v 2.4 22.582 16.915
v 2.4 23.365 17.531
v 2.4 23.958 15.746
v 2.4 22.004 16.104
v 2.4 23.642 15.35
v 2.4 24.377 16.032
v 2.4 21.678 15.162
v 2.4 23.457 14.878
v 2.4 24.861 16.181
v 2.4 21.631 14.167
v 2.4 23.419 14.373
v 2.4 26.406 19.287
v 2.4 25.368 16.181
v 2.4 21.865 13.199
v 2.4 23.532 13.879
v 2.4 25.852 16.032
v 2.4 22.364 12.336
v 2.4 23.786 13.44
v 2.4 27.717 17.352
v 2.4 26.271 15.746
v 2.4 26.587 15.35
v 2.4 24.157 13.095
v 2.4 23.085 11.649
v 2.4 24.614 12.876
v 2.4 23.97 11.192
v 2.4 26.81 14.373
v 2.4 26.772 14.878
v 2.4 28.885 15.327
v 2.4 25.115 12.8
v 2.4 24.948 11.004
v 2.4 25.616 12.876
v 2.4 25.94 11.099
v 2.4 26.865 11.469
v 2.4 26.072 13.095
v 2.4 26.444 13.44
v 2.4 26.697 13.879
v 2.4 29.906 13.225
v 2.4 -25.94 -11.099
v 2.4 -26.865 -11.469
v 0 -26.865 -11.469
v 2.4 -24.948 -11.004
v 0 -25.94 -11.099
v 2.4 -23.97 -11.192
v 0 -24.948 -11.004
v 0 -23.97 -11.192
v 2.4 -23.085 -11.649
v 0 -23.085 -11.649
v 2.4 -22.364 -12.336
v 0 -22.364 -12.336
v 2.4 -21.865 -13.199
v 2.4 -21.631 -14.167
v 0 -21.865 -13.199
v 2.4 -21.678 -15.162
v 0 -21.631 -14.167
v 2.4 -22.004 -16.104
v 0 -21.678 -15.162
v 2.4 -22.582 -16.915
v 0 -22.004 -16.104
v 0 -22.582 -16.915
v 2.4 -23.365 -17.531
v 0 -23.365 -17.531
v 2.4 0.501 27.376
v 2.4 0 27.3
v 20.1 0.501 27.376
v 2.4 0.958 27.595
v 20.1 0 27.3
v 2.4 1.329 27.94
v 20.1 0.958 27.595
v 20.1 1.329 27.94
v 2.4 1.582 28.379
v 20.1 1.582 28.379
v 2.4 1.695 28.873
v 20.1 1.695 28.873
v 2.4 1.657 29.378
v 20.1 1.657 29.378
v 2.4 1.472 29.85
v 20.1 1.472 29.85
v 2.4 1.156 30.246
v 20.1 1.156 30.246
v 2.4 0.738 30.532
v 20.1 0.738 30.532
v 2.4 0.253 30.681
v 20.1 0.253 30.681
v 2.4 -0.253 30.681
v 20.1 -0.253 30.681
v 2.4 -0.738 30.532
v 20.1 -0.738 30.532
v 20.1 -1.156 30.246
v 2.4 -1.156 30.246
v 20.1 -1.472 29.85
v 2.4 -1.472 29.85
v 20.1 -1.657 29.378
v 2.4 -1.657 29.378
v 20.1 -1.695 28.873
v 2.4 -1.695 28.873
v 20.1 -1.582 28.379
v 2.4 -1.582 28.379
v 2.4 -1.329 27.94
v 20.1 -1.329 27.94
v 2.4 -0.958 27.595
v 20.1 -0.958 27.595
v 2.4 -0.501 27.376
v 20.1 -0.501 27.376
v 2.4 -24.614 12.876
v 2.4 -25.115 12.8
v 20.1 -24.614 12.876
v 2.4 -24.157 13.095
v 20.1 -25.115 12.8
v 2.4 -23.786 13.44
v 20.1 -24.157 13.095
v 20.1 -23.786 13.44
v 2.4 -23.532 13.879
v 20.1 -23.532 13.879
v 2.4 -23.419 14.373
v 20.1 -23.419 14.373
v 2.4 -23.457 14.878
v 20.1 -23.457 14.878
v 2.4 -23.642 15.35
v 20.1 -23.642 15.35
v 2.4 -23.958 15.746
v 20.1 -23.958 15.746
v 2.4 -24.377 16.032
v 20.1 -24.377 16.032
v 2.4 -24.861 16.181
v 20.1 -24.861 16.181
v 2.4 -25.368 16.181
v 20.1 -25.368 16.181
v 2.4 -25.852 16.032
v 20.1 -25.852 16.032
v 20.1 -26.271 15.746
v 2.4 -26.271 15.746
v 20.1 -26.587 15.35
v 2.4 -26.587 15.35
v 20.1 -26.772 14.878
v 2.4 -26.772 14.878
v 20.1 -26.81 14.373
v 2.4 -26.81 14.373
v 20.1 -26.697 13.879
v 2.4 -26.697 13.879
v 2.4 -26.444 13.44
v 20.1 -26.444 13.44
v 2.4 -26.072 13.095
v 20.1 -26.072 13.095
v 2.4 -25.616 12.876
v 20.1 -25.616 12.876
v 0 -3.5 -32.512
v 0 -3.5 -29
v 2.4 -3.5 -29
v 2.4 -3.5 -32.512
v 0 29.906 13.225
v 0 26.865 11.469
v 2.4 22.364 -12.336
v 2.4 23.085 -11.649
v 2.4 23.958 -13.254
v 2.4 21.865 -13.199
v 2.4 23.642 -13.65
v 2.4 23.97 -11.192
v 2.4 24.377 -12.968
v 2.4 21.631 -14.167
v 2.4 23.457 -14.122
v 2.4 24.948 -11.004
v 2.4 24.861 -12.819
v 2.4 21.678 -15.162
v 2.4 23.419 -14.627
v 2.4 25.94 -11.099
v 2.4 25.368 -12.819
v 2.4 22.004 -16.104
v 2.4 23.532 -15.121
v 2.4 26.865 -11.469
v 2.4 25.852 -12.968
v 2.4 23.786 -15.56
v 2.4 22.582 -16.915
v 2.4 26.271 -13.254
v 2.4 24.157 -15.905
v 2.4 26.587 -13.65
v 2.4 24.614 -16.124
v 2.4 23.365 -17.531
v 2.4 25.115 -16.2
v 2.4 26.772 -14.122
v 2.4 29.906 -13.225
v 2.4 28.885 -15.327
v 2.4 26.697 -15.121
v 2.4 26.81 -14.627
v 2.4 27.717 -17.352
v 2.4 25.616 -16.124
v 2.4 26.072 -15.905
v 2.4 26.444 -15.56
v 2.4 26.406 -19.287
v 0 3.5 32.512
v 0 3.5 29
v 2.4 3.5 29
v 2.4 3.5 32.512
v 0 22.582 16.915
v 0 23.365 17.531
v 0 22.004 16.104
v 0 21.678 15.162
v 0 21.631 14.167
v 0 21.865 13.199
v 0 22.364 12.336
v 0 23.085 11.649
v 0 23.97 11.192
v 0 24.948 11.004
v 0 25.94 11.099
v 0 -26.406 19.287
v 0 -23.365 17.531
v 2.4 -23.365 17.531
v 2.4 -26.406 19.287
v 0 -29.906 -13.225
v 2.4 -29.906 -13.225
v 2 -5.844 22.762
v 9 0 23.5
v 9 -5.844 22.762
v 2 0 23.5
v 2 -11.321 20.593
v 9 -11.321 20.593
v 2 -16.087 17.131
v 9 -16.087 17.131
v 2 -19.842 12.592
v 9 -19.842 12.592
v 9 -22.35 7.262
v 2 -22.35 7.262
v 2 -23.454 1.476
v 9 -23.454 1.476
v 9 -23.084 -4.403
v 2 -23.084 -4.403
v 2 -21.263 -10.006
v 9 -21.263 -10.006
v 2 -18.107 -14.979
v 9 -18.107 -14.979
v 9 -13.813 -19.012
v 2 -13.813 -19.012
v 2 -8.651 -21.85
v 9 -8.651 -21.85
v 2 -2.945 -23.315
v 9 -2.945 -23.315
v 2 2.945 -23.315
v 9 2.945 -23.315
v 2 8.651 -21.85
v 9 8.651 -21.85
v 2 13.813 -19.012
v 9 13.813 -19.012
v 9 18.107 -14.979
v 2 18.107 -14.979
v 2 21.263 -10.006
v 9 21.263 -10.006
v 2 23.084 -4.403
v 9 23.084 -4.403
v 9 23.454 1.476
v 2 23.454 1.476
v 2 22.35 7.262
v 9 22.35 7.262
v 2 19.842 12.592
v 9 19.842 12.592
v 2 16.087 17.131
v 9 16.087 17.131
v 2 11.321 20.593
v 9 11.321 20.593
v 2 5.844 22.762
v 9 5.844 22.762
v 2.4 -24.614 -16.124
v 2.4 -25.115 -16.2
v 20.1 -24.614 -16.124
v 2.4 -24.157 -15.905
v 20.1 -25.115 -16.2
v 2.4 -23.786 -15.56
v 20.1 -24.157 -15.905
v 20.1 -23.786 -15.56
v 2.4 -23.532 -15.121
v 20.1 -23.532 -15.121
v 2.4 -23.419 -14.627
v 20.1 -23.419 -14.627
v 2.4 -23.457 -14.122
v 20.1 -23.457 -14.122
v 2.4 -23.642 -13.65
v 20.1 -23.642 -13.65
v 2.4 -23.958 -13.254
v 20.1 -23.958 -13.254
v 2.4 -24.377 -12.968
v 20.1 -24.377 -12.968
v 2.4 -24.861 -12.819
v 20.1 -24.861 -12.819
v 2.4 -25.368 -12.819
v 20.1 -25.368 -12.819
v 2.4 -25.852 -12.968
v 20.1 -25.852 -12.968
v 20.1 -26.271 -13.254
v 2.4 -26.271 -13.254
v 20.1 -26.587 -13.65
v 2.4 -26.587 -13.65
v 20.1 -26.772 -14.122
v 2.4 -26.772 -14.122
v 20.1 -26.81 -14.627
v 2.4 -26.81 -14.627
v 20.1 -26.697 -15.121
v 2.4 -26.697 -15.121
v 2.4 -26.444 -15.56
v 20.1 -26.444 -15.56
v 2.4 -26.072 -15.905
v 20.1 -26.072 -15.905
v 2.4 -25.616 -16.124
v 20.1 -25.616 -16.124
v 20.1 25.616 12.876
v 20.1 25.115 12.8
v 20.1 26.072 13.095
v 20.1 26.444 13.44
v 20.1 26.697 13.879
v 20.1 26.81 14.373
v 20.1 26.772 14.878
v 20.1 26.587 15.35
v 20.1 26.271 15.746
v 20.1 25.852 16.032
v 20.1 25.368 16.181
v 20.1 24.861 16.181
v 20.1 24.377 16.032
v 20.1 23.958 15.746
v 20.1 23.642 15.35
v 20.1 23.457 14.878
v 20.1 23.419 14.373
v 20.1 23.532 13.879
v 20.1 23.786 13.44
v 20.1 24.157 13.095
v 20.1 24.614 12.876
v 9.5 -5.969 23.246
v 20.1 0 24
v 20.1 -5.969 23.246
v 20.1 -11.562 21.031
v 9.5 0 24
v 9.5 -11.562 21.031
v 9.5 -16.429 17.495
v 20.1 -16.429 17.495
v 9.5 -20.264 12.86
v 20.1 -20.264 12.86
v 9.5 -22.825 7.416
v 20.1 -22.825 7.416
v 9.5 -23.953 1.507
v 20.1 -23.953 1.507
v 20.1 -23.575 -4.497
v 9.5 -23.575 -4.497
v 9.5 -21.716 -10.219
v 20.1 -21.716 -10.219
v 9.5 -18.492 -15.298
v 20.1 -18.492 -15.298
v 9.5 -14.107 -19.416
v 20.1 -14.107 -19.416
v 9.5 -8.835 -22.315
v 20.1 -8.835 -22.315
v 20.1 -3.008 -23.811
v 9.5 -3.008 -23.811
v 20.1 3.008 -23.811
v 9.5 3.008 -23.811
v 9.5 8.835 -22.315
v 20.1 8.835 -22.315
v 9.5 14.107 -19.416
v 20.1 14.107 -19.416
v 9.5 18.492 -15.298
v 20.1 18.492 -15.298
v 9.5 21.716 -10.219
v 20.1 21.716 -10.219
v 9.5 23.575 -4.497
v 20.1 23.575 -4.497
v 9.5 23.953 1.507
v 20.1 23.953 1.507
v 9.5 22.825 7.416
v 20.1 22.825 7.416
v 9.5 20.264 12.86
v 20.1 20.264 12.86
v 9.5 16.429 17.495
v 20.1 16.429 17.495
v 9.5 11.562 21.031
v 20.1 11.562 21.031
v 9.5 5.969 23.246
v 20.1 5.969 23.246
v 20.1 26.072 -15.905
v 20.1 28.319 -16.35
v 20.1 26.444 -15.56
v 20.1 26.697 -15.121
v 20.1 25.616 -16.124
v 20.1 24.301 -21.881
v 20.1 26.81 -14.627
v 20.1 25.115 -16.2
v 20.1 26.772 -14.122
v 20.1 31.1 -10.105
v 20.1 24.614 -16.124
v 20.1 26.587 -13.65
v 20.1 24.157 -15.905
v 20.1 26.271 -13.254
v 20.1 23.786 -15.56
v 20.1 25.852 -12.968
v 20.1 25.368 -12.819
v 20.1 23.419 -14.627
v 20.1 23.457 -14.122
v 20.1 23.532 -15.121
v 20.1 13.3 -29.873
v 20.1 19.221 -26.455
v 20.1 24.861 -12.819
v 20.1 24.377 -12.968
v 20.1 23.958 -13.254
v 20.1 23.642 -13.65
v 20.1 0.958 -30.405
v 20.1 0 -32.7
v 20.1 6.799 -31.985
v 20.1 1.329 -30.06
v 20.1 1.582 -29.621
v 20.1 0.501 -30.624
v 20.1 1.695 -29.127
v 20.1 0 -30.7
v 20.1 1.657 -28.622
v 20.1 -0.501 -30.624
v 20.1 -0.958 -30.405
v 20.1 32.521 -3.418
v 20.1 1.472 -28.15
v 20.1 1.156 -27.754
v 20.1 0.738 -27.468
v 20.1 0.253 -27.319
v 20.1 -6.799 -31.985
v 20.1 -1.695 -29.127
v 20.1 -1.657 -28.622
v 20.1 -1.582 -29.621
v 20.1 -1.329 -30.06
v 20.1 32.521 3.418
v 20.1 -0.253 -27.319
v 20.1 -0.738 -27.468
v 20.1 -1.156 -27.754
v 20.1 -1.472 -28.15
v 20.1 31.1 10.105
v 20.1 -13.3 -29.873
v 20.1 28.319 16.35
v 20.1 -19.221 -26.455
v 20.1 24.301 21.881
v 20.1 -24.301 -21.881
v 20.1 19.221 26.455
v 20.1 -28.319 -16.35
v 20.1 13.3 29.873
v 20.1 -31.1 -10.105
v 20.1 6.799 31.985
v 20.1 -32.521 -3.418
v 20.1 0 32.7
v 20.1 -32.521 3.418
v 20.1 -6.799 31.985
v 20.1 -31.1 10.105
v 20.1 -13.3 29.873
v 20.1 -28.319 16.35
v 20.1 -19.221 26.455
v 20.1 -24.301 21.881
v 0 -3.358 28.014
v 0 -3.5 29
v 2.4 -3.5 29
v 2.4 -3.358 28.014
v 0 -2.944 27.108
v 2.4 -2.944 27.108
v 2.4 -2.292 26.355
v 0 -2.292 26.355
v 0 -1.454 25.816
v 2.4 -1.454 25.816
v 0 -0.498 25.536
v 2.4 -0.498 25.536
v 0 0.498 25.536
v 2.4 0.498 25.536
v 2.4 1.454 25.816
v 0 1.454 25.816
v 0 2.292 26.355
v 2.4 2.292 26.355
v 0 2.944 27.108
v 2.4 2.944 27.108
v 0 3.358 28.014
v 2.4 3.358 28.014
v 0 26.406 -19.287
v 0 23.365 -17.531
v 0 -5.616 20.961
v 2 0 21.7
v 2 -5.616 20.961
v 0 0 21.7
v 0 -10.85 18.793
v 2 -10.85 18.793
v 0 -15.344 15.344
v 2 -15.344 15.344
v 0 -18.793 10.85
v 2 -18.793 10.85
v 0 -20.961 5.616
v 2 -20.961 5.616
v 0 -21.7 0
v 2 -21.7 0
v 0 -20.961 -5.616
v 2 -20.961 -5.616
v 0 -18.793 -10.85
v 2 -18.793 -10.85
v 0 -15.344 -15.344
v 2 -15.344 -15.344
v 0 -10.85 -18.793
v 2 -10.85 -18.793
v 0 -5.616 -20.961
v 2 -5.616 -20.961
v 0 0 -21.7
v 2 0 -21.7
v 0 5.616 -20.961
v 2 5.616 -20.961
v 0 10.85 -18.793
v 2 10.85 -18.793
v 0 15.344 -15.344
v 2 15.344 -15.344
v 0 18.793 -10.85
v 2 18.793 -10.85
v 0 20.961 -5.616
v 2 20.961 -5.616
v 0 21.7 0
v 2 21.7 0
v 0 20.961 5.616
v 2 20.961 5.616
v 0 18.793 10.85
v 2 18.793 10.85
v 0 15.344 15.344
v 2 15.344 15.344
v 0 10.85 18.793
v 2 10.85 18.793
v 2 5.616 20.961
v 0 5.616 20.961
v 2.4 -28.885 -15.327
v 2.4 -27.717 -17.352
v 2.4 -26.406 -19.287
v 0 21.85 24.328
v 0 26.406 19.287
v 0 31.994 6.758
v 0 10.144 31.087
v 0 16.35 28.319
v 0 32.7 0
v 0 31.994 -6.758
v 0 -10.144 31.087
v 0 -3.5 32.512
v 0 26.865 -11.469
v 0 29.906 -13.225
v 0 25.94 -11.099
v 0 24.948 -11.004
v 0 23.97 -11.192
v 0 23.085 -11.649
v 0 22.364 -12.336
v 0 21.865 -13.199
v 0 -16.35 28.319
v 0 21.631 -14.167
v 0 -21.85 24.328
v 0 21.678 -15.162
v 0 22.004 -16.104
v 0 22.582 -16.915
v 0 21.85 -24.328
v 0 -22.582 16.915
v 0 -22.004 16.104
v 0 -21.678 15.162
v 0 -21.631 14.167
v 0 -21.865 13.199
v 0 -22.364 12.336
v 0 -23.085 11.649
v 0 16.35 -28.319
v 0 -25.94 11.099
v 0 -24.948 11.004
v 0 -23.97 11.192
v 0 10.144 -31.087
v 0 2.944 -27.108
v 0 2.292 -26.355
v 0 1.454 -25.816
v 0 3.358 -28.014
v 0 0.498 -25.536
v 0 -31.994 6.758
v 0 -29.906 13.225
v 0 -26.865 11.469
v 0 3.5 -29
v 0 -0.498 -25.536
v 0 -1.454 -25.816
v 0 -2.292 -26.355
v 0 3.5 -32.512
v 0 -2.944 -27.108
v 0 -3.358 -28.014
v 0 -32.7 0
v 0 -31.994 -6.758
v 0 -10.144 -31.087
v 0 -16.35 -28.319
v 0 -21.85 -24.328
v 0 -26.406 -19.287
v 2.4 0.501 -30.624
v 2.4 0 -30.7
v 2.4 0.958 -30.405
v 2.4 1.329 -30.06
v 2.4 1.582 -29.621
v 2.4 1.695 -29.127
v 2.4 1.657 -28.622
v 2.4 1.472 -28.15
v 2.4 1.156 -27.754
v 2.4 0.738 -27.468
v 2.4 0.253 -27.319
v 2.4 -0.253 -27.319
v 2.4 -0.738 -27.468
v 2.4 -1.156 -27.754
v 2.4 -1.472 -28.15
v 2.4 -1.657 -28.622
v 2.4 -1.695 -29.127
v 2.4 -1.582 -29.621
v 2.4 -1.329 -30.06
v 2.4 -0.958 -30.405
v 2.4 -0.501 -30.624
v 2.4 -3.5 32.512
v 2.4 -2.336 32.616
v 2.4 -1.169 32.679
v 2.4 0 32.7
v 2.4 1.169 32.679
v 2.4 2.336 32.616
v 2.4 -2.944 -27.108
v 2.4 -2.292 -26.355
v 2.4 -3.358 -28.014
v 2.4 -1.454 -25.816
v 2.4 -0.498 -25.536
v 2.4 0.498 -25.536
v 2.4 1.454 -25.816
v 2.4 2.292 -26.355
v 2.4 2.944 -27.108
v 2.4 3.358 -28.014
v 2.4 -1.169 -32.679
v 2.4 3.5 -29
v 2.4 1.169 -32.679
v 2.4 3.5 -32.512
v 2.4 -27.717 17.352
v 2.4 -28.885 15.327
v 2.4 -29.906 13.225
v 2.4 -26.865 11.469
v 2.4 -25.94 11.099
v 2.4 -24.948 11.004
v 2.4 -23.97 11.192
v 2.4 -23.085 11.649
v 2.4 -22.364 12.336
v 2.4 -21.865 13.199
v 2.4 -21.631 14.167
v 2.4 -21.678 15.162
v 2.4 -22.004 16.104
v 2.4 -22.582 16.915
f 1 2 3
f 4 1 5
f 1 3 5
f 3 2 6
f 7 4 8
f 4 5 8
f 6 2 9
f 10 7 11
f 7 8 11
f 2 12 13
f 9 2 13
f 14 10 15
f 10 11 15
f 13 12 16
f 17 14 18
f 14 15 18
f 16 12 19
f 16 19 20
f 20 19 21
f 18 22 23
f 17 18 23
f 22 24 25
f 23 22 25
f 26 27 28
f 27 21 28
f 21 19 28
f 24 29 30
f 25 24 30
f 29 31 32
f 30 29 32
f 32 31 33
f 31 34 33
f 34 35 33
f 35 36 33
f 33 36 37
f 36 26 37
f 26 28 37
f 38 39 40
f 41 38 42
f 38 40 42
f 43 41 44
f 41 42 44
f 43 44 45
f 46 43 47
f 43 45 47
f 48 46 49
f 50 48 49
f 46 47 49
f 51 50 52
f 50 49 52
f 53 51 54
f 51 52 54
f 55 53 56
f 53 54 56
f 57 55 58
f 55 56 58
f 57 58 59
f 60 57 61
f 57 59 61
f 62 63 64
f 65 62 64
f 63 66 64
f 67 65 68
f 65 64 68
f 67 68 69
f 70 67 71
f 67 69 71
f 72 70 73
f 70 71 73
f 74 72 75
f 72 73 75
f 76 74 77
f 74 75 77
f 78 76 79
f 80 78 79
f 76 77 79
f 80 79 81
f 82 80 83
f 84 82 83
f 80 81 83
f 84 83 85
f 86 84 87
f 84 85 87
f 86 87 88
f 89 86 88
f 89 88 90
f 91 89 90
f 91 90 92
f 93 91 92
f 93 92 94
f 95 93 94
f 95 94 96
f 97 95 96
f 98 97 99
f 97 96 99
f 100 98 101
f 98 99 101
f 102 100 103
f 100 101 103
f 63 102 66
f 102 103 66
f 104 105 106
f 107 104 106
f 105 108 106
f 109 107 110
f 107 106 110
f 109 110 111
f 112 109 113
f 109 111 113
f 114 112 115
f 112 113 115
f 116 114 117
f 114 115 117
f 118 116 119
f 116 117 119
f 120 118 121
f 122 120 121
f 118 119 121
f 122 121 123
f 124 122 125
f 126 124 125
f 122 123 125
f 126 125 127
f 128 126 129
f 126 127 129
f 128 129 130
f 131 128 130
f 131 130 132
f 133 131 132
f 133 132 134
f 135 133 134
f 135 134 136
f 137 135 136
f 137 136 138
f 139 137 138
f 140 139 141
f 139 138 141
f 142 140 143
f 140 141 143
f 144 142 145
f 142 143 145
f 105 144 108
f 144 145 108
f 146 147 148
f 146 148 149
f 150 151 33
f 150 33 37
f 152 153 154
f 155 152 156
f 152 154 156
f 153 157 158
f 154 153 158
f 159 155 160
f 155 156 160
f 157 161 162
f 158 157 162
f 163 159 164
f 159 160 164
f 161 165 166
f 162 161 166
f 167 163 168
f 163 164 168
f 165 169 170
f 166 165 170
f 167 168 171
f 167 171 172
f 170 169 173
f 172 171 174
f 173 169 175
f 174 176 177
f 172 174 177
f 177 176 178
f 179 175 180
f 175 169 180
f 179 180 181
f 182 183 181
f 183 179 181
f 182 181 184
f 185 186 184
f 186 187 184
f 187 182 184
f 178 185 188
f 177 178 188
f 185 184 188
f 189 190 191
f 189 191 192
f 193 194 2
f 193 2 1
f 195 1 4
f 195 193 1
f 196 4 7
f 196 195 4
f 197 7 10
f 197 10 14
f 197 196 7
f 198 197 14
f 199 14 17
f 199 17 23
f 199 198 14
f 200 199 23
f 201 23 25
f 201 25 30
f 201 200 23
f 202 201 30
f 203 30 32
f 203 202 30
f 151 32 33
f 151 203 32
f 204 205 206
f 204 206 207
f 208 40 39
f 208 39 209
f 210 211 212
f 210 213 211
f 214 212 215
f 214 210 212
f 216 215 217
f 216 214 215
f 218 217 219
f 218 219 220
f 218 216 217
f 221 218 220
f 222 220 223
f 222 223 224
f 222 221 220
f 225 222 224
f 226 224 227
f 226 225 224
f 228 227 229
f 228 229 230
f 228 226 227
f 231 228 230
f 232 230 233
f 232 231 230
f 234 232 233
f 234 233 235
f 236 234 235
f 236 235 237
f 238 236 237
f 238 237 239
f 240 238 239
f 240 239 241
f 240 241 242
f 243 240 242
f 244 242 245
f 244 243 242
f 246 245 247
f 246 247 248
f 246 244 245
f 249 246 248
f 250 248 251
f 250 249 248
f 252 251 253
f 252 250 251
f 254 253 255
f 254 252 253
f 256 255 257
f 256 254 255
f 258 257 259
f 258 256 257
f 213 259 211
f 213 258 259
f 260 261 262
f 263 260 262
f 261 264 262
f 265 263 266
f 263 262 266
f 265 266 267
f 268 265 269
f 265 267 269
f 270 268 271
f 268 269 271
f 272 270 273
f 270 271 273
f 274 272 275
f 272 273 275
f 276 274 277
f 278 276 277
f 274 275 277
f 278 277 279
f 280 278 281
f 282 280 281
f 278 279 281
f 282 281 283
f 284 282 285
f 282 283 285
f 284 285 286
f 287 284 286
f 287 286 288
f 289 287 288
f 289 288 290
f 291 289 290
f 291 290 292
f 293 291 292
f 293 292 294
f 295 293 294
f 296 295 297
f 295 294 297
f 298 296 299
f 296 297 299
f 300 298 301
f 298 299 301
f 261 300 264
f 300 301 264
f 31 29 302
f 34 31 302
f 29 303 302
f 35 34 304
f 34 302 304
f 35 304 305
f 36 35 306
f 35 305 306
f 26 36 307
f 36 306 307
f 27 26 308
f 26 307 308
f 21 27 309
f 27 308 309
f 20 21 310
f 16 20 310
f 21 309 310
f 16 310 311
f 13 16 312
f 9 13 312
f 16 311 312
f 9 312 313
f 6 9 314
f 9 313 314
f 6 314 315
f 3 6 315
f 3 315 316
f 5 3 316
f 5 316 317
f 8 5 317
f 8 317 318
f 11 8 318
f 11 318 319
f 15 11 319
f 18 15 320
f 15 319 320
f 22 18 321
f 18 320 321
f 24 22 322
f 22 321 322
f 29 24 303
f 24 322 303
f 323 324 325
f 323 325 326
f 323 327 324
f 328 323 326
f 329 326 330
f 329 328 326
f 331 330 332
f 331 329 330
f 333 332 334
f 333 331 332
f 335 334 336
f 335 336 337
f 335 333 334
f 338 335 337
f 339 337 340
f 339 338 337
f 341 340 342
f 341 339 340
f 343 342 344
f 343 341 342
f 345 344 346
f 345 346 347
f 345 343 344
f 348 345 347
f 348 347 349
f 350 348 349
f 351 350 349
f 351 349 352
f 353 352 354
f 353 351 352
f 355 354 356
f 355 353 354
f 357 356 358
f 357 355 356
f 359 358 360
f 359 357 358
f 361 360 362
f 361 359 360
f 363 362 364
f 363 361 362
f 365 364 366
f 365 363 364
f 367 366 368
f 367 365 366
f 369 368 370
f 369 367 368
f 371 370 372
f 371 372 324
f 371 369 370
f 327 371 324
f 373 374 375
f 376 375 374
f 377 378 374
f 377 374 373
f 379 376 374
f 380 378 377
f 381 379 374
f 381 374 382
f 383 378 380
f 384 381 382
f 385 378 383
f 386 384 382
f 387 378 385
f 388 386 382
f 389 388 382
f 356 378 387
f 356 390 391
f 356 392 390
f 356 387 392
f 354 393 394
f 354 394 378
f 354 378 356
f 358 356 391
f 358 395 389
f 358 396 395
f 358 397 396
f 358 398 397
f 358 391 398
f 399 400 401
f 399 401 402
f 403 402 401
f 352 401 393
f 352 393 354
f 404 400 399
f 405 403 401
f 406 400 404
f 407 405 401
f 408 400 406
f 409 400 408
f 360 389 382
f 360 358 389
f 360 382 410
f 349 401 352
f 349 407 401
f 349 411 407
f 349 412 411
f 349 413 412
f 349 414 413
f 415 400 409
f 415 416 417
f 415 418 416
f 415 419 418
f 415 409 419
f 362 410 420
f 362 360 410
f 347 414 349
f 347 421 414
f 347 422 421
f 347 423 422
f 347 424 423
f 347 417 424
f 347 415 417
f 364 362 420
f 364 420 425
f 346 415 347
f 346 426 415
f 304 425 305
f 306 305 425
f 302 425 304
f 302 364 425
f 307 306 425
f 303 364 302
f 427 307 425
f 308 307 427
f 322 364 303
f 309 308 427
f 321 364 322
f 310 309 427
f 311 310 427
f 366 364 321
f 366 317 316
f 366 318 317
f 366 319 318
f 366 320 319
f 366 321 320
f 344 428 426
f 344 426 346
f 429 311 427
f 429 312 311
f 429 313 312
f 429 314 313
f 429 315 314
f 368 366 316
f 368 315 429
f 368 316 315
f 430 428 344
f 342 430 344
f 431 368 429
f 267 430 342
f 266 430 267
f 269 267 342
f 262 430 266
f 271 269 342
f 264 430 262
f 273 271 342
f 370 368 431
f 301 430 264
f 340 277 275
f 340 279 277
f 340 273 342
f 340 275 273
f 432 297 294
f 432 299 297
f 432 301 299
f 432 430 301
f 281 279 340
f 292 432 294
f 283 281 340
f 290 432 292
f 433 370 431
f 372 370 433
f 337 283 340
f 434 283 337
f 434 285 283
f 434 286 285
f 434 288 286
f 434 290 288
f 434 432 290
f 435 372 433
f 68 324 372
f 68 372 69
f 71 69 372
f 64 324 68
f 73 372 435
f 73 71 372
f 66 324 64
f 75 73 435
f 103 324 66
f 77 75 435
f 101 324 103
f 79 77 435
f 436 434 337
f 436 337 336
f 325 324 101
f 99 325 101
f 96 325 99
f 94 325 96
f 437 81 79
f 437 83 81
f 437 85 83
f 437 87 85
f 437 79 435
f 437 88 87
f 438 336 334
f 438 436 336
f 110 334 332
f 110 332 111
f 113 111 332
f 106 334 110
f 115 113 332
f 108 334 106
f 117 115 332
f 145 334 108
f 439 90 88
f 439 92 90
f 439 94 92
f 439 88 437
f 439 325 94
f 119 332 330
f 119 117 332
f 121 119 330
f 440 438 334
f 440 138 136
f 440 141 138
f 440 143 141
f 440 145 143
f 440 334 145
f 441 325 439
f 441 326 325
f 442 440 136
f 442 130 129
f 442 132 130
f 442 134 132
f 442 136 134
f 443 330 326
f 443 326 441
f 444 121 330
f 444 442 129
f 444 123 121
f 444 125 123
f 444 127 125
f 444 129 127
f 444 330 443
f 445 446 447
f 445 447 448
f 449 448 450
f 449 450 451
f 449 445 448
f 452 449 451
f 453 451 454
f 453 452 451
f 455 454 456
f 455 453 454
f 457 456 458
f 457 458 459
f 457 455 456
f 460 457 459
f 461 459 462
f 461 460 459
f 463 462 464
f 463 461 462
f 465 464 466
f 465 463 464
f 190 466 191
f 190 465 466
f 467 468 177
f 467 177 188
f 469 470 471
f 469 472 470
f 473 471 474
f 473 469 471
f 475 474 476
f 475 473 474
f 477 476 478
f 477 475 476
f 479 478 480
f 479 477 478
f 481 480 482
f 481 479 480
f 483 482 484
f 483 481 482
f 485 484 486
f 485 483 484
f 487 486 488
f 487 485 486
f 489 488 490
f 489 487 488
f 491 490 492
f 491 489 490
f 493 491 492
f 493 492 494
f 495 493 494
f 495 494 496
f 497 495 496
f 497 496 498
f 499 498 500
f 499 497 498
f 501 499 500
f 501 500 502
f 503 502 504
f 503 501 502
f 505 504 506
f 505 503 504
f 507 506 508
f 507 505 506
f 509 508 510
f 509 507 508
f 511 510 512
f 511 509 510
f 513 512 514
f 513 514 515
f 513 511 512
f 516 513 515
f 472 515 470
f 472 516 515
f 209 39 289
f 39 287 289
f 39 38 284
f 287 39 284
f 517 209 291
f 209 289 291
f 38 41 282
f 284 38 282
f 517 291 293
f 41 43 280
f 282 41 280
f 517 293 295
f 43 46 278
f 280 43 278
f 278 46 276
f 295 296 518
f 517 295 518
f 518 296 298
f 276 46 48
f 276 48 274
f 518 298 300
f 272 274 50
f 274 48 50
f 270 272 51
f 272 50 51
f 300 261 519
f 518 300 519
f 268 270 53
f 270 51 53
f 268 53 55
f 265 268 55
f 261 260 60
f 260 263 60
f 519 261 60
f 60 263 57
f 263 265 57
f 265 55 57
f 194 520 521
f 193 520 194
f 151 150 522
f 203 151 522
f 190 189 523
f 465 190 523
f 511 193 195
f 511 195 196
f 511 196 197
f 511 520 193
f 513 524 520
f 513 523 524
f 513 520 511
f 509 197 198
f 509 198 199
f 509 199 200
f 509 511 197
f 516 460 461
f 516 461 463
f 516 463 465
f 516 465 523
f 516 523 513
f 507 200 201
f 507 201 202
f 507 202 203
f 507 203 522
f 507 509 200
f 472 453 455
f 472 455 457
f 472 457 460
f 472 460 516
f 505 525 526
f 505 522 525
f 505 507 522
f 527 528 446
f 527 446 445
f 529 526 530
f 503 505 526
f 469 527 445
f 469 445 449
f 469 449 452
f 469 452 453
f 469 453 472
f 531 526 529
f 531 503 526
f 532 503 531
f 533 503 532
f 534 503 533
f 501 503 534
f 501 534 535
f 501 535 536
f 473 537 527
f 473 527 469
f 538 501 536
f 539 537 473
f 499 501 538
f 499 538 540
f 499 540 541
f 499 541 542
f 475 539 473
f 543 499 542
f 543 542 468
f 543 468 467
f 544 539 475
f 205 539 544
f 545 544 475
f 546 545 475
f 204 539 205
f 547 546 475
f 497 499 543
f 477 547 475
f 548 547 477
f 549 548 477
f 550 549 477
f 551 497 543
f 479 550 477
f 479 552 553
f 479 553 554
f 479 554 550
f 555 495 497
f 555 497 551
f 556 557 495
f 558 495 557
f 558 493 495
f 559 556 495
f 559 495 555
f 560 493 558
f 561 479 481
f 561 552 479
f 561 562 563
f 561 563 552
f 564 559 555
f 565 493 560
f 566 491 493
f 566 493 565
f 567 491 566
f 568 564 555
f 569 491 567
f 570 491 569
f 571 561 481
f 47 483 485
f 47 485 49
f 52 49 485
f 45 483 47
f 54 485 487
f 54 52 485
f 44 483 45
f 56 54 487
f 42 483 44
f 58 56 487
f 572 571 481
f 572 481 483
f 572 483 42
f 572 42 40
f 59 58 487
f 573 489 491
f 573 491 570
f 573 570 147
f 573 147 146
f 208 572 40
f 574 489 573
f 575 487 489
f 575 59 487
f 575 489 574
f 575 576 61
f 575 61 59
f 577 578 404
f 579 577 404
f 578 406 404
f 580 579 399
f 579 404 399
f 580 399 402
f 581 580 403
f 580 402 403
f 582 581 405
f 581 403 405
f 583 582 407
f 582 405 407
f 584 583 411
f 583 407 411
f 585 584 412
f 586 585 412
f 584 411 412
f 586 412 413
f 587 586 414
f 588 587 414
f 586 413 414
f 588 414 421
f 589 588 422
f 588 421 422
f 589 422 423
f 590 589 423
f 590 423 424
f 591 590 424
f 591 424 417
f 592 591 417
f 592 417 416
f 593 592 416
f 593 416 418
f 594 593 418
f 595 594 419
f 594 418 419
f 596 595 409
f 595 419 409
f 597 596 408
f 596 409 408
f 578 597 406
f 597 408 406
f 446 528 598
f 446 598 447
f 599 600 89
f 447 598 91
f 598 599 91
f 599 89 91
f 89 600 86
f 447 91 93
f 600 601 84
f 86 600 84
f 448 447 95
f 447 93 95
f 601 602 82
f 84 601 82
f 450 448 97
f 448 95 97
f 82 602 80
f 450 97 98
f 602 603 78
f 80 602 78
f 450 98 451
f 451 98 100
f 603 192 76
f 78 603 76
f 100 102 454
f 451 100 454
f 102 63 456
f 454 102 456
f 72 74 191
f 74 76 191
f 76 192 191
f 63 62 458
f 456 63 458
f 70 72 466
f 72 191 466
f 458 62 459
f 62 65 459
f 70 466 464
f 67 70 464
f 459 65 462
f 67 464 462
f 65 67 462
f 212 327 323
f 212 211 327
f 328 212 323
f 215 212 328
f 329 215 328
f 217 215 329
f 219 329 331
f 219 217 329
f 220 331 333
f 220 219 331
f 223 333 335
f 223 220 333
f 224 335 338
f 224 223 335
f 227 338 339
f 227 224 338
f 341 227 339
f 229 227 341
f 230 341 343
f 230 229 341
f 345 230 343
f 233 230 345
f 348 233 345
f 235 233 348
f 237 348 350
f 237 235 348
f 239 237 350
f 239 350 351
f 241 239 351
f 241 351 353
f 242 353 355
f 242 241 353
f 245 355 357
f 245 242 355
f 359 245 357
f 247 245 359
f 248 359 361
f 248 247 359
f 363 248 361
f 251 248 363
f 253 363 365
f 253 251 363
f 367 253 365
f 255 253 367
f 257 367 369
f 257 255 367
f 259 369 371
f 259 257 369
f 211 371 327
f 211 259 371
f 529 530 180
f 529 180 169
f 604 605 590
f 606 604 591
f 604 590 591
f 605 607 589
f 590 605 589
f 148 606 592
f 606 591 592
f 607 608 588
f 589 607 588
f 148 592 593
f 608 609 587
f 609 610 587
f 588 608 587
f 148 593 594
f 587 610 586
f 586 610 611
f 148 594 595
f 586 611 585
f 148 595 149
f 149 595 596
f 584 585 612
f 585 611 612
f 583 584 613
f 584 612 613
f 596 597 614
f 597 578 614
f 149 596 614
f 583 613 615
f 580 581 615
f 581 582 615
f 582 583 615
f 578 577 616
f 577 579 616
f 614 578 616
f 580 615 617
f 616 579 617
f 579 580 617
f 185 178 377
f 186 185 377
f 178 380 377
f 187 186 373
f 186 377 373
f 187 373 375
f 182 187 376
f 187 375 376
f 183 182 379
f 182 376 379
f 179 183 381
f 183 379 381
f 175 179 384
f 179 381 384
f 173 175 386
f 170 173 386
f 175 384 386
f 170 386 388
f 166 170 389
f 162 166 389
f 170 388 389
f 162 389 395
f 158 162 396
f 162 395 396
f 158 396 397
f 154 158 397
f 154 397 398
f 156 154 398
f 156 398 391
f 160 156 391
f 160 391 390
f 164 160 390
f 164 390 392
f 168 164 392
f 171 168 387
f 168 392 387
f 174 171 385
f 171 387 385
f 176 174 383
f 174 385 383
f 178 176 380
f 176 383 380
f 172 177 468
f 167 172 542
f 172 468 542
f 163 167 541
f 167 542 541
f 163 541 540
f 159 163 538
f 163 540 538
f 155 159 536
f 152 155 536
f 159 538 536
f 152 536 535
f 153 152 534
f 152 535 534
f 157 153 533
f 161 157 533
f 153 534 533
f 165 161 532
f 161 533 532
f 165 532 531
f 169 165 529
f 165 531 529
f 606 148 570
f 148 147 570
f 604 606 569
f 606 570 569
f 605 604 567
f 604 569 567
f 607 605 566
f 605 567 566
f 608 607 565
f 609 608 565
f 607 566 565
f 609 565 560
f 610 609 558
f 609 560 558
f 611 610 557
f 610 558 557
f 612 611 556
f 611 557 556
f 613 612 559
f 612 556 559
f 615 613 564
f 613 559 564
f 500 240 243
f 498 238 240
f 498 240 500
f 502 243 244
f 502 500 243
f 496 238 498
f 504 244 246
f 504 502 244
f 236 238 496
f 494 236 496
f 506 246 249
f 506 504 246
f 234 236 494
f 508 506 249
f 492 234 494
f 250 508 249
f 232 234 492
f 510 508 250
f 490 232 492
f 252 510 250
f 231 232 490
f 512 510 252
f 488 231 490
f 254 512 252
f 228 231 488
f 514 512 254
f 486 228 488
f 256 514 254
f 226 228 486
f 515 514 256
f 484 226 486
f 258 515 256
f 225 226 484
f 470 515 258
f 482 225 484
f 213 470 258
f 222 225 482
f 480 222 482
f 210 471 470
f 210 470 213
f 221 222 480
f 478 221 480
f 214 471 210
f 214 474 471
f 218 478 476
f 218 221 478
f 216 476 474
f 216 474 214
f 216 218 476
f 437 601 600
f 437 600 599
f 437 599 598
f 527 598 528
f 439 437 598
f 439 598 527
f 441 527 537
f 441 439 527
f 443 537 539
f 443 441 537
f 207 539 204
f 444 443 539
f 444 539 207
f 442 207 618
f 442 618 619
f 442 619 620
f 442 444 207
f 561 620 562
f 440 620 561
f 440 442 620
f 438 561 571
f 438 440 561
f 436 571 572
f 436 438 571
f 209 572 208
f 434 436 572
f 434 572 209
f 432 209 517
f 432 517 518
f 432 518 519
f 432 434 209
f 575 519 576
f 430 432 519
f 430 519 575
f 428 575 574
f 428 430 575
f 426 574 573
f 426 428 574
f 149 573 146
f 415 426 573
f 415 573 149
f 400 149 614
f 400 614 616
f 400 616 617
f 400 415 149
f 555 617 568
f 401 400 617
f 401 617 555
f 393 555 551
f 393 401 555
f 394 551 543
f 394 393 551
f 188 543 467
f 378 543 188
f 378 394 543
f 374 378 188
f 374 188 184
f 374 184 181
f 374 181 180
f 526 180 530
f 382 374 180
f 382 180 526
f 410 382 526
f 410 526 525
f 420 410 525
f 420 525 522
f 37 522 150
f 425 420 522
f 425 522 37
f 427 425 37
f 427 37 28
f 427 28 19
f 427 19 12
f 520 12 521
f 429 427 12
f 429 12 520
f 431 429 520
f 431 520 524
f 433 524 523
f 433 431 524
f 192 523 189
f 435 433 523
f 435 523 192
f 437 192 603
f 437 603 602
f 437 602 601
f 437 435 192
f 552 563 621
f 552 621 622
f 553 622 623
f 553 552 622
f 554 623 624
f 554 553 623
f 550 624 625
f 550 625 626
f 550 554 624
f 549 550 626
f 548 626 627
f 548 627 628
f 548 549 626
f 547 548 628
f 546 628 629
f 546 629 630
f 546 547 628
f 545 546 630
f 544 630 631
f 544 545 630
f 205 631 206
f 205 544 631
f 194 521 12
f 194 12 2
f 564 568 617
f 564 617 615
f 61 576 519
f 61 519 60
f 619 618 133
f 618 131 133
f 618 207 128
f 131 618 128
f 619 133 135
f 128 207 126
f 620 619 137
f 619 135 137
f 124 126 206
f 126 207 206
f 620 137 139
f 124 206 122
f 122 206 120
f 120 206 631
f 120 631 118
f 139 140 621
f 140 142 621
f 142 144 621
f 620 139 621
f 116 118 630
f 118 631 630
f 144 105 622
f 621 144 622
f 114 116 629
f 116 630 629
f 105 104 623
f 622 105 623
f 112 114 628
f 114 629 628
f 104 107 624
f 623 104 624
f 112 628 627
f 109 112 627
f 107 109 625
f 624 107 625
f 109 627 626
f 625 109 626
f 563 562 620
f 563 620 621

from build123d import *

# Parameters (mm, degrees)
REFRENTADO_PARA_TORNILLO_CON_CABEZA_TRON_D           = 3.4
REFRENTADO_PARA_TORNILLO_CON_CABEZA_TRON_CBORE_D     = 7
REFRENTADO_PARA_TORNILLO_CON_CABEZA_TRON_CBORE_DEPTH = 2.4
CORTAR_EXTRUIR1_DEPTH                                = 2.4


with BuildPart() as part:
    # Croquis2 → Revolución1 (revolve)
    with BuildSketch(Plane(origin=(0, 0, 0), x_dir=(1, 0, 0), z_dir=(0, 1, 0)), mode=Mode.PRIVATE) as revoluci_n1_sk:
        Polygon((0, 32.7), (20.1, 32.7), (20.1, 24), (9.5, 24), (9, 23.5), (2, 23.5), (2, 21.7), (0, 21.7), align=None)
    revolve(revoluci_n1_sk.sketch.rotate(Axis((-10.750662053, 0, 0), (1, 0, 0)), 180), axis=Axis((-10.750662053, 0, 0), (1, 0, 0)))

    # Refrentado para tornillo con cabeza troncocónica de M31 (through all)
    with Locations(Plane.ZY):
        with Locations((14.5, 25.11473671), (29, 0), (14.5, -25.11473671), (-14.5, -25.11473671), (-29, 0), (-14.5, 25.11473671)):
            CounterBoreHole(REFRENTADO_PARA_TORNILLO_CON_CABEZA_TRON_D / 2, REFRENTADO_PARA_TORNILLO_CON_CABEZA_TRON_CBORE_D / 2, REFRENTADO_PARA_TORNILLO_CON_CABEZA_TRON_CBORE_DEPTH)

    # Croquis6 → Cortar-Extruir1 (cut)
    with BuildSketch(Plane.ZY):
        with BuildLine():
            Line((29, 3.5), (32.512151574, 3.5))
            ThreePointArc((32.512151574, 3.5), (32.7, 0), (32.512151574, -3.5))
            Line((32.512151574, -3.5), (29, -3.5))
            ThreePointArc((29, -3.5), (25.5, 0), (29, 3.5))
        make_face()
        with BuildLine():
            Line((17.531088913, -23.36473671), (19.2871647, -26.406349195))
            ThreePointArc((19.2871647, -26.406349195), (16.35, -28.319030704), (13.224986874, -29.906349195))
            Line((13.224986874, -29.906349195), (11.468911087, -26.86473671))
            ThreePointArc((11.468911087, -26.86473671), (12.75, -22.083647797), (17.531088913, -23.36473671))
        make_face()
        with BuildLine():
            Line((-11.468911087, -26.86473671), (-13.224986874, -29.906349195))
            ThreePointArc((-13.224986874, -29.906349195), (-16.35, -28.319030704), (-19.2871647, -26.406349195))
            Line((-19.2871647, -26.406349195), (-17.531088913, -23.36473671))
            ThreePointArc((-17.531088913, -23.36473671), (-12.75, -22.083647797), (-11.468911087, -26.86473671))
        make_face()
        with BuildLine():
            Line((-29, -3.5), (-32.512151574, -3.5))
            ThreePointArc((-32.512151574, -3.5), (-32.7, 0), (-32.512151574, 3.5))
            Line((-32.512151574, 3.5), (-29, 3.5))
            ThreePointArc((-29, 3.5), (-25.5, 0), (-29, -3.5))
        make_face()
        with BuildLine():
            Line((-17.531088913, 23.36473671), (-19.2871647, 26.406349195))
            ThreePointArc((-19.2871647, 26.406349195), (-16.35, 28.319030704), (-13.224986874, 29.906349195))
            Line((-13.224986874, 29.906349195), (-11.468911087, 26.86473671))
            ThreePointArc((-11.468911087, 26.86473671), (-12.75, 22.083647797), (-17.531088913, 23.36473671))
        make_face()
        with BuildLine():
            Line((11.468911087, 26.86473671), (13.224986874, 29.906349195))
            ThreePointArc((13.224986874, 29.906349195), (16.35, 28.319030704), (19.2871647, 26.406349195))
            Line((19.2871647, 26.406349195), (17.531088913, 23.36473671))
            ThreePointArc((17.531088913, 23.36473671), (12.75, 22.083647797), (11.468911087, 26.86473671))
        make_face()
    extrude(amount=-CORTAR_EXTRUIR1_DEPTH, mode=Mode.SUBTRACT)


solid = part.part
